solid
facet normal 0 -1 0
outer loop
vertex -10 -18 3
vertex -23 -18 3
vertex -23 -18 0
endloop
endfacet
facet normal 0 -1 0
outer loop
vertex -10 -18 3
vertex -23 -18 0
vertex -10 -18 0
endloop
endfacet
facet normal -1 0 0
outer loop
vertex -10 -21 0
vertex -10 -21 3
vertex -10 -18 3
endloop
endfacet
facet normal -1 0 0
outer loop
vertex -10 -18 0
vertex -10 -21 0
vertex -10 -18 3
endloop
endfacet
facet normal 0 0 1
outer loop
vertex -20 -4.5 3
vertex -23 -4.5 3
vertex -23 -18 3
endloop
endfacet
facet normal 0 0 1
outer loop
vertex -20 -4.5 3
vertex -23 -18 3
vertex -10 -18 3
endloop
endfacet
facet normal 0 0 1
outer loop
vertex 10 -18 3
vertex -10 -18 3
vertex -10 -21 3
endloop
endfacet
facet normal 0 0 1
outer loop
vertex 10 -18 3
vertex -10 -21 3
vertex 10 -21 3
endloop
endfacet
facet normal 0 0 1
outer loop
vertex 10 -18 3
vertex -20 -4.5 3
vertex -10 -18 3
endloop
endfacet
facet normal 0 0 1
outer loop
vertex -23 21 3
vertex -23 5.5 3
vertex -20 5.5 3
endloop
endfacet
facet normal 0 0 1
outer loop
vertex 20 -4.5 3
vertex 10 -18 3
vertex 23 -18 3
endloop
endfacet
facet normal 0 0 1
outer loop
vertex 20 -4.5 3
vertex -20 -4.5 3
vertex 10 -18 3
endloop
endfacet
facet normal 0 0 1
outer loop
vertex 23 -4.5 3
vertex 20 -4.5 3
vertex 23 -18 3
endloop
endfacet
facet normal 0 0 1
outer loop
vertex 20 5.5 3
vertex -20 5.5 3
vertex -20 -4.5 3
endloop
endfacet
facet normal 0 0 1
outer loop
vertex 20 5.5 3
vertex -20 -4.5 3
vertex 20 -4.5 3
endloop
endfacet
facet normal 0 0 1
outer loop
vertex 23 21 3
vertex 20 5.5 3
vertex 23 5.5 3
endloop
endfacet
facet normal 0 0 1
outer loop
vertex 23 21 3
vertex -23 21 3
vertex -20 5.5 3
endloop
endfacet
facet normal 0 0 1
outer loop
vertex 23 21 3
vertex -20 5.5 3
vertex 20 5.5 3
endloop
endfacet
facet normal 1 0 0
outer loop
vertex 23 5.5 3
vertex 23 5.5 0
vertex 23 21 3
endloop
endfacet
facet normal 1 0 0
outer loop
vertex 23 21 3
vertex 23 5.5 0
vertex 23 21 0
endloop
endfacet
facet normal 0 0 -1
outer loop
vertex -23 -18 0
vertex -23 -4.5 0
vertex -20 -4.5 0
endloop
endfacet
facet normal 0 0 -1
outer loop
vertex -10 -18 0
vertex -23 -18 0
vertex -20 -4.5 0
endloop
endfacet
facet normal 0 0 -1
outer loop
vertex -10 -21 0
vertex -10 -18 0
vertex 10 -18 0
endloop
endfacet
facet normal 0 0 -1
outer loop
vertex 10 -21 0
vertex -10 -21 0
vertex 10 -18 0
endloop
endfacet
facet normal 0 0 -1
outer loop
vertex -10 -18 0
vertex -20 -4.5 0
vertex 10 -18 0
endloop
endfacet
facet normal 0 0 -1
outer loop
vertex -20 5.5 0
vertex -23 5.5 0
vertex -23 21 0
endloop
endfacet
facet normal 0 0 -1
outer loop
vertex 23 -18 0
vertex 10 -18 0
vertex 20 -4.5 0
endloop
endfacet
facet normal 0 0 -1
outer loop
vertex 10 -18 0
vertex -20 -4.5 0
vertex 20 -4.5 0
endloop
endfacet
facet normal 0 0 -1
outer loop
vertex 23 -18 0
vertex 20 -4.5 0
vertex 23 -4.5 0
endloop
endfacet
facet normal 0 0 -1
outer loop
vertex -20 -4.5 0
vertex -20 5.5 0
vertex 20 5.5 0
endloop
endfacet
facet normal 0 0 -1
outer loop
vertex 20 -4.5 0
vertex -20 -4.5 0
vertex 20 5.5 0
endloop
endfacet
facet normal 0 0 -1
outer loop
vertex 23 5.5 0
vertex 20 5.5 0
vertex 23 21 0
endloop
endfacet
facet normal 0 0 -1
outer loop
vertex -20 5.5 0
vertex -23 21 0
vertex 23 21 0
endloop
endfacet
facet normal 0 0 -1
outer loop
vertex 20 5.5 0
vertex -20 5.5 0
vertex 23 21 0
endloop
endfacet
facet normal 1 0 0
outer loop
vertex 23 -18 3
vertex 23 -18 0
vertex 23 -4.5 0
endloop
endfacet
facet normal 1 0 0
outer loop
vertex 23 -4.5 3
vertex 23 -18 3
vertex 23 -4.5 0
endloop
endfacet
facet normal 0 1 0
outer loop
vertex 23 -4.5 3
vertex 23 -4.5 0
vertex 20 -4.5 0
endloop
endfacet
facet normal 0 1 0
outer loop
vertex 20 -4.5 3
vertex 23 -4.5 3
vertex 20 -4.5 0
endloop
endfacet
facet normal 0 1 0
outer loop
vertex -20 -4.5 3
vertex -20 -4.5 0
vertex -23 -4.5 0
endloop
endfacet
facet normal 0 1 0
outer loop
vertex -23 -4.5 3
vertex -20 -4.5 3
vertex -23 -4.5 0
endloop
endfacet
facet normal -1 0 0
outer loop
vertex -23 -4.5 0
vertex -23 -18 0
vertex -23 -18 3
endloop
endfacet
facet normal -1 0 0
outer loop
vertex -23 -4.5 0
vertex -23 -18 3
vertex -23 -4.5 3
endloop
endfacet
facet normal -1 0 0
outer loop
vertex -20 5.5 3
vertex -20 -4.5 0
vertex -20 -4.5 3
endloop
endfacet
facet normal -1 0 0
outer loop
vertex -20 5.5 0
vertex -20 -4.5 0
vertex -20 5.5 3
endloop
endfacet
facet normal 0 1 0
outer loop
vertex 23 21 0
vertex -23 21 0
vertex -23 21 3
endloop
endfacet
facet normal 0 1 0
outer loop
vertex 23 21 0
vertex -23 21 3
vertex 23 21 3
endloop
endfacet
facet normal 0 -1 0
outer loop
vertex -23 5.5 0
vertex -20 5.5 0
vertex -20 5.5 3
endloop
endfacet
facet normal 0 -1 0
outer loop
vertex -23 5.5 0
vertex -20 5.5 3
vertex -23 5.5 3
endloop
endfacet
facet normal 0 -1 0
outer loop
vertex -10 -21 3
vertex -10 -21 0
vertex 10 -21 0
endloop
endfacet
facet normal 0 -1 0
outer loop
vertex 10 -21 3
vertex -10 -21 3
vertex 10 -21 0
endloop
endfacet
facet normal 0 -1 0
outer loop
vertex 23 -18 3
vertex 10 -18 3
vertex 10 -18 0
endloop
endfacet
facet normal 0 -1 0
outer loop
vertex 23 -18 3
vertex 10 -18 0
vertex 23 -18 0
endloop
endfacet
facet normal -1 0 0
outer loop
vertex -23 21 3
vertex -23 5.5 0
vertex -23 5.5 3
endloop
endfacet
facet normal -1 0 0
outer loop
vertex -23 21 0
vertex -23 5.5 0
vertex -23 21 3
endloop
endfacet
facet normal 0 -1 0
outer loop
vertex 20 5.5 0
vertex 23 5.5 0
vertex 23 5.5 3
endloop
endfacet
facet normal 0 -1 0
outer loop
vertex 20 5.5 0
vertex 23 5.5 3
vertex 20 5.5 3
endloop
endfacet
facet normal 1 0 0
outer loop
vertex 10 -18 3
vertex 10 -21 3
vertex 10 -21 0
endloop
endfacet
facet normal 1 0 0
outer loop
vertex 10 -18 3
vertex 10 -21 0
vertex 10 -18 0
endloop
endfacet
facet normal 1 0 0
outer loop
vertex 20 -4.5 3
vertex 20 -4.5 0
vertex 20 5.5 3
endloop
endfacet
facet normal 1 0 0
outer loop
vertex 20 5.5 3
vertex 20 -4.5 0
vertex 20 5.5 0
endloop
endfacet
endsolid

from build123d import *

# Parameters (mm, degrees)
SKETCH1_W           = 46
SKETCH1_H           = 42
BOSS_EXTRUDE1_DEPTH = 3
SKETCH2_W           = 13
SKETCH2_H           = 3
CUT_EXTRUDE1_DEPTH  = 32.288975694
SKETCH3_W           = 3
SKETCH3_H           = 10
CUT_EXTRUDE2_DEPTH  = 32.288975694


with BuildPart() as part:
    # Sketch1 → Boss-Extrude1 (new body)
    with BuildSketch(Plane.XY):
        Rectangle(SKETCH1_W, SKETCH1_H)
    extrude(amount=BOSS_EXTRUDE1_DEPTH)

    # Sketch2 → Cut-Extrude1 (cut, through all)
    with BuildSketch(Plane.XY.offset(3)):
        with Locations((-16.5, -19.5)):
            Rectangle(SKETCH2_W, SKETCH2_H)
        with Locations((16.5, -19.5)):
            Rectangle(SKETCH2_W, SKETCH2_H)
    extrude(amount=-CUT_EXTRUDE1_DEPTH, mode=Mode.SUBTRACT)

    # Sketch3 → Cut-Extrude2 (cut, through all)
    with BuildSketch(Plane(origin=(0, 0, 0), x_dir=(-1, 0, 0), z_dir=(0, 0, -1))):
        with Locations((-21.5, 0.5)):
            Rectangle(SKETCH3_W, SKETCH3_H)
        with Locations((21.5, 0.5)):
            Rectangle(SKETCH3_W, SKETCH3_H)
    extrude(amount=-CUT_EXTRUDE2_DEPTH, mode=Mode.SUBTRACT)


solid = part.part
